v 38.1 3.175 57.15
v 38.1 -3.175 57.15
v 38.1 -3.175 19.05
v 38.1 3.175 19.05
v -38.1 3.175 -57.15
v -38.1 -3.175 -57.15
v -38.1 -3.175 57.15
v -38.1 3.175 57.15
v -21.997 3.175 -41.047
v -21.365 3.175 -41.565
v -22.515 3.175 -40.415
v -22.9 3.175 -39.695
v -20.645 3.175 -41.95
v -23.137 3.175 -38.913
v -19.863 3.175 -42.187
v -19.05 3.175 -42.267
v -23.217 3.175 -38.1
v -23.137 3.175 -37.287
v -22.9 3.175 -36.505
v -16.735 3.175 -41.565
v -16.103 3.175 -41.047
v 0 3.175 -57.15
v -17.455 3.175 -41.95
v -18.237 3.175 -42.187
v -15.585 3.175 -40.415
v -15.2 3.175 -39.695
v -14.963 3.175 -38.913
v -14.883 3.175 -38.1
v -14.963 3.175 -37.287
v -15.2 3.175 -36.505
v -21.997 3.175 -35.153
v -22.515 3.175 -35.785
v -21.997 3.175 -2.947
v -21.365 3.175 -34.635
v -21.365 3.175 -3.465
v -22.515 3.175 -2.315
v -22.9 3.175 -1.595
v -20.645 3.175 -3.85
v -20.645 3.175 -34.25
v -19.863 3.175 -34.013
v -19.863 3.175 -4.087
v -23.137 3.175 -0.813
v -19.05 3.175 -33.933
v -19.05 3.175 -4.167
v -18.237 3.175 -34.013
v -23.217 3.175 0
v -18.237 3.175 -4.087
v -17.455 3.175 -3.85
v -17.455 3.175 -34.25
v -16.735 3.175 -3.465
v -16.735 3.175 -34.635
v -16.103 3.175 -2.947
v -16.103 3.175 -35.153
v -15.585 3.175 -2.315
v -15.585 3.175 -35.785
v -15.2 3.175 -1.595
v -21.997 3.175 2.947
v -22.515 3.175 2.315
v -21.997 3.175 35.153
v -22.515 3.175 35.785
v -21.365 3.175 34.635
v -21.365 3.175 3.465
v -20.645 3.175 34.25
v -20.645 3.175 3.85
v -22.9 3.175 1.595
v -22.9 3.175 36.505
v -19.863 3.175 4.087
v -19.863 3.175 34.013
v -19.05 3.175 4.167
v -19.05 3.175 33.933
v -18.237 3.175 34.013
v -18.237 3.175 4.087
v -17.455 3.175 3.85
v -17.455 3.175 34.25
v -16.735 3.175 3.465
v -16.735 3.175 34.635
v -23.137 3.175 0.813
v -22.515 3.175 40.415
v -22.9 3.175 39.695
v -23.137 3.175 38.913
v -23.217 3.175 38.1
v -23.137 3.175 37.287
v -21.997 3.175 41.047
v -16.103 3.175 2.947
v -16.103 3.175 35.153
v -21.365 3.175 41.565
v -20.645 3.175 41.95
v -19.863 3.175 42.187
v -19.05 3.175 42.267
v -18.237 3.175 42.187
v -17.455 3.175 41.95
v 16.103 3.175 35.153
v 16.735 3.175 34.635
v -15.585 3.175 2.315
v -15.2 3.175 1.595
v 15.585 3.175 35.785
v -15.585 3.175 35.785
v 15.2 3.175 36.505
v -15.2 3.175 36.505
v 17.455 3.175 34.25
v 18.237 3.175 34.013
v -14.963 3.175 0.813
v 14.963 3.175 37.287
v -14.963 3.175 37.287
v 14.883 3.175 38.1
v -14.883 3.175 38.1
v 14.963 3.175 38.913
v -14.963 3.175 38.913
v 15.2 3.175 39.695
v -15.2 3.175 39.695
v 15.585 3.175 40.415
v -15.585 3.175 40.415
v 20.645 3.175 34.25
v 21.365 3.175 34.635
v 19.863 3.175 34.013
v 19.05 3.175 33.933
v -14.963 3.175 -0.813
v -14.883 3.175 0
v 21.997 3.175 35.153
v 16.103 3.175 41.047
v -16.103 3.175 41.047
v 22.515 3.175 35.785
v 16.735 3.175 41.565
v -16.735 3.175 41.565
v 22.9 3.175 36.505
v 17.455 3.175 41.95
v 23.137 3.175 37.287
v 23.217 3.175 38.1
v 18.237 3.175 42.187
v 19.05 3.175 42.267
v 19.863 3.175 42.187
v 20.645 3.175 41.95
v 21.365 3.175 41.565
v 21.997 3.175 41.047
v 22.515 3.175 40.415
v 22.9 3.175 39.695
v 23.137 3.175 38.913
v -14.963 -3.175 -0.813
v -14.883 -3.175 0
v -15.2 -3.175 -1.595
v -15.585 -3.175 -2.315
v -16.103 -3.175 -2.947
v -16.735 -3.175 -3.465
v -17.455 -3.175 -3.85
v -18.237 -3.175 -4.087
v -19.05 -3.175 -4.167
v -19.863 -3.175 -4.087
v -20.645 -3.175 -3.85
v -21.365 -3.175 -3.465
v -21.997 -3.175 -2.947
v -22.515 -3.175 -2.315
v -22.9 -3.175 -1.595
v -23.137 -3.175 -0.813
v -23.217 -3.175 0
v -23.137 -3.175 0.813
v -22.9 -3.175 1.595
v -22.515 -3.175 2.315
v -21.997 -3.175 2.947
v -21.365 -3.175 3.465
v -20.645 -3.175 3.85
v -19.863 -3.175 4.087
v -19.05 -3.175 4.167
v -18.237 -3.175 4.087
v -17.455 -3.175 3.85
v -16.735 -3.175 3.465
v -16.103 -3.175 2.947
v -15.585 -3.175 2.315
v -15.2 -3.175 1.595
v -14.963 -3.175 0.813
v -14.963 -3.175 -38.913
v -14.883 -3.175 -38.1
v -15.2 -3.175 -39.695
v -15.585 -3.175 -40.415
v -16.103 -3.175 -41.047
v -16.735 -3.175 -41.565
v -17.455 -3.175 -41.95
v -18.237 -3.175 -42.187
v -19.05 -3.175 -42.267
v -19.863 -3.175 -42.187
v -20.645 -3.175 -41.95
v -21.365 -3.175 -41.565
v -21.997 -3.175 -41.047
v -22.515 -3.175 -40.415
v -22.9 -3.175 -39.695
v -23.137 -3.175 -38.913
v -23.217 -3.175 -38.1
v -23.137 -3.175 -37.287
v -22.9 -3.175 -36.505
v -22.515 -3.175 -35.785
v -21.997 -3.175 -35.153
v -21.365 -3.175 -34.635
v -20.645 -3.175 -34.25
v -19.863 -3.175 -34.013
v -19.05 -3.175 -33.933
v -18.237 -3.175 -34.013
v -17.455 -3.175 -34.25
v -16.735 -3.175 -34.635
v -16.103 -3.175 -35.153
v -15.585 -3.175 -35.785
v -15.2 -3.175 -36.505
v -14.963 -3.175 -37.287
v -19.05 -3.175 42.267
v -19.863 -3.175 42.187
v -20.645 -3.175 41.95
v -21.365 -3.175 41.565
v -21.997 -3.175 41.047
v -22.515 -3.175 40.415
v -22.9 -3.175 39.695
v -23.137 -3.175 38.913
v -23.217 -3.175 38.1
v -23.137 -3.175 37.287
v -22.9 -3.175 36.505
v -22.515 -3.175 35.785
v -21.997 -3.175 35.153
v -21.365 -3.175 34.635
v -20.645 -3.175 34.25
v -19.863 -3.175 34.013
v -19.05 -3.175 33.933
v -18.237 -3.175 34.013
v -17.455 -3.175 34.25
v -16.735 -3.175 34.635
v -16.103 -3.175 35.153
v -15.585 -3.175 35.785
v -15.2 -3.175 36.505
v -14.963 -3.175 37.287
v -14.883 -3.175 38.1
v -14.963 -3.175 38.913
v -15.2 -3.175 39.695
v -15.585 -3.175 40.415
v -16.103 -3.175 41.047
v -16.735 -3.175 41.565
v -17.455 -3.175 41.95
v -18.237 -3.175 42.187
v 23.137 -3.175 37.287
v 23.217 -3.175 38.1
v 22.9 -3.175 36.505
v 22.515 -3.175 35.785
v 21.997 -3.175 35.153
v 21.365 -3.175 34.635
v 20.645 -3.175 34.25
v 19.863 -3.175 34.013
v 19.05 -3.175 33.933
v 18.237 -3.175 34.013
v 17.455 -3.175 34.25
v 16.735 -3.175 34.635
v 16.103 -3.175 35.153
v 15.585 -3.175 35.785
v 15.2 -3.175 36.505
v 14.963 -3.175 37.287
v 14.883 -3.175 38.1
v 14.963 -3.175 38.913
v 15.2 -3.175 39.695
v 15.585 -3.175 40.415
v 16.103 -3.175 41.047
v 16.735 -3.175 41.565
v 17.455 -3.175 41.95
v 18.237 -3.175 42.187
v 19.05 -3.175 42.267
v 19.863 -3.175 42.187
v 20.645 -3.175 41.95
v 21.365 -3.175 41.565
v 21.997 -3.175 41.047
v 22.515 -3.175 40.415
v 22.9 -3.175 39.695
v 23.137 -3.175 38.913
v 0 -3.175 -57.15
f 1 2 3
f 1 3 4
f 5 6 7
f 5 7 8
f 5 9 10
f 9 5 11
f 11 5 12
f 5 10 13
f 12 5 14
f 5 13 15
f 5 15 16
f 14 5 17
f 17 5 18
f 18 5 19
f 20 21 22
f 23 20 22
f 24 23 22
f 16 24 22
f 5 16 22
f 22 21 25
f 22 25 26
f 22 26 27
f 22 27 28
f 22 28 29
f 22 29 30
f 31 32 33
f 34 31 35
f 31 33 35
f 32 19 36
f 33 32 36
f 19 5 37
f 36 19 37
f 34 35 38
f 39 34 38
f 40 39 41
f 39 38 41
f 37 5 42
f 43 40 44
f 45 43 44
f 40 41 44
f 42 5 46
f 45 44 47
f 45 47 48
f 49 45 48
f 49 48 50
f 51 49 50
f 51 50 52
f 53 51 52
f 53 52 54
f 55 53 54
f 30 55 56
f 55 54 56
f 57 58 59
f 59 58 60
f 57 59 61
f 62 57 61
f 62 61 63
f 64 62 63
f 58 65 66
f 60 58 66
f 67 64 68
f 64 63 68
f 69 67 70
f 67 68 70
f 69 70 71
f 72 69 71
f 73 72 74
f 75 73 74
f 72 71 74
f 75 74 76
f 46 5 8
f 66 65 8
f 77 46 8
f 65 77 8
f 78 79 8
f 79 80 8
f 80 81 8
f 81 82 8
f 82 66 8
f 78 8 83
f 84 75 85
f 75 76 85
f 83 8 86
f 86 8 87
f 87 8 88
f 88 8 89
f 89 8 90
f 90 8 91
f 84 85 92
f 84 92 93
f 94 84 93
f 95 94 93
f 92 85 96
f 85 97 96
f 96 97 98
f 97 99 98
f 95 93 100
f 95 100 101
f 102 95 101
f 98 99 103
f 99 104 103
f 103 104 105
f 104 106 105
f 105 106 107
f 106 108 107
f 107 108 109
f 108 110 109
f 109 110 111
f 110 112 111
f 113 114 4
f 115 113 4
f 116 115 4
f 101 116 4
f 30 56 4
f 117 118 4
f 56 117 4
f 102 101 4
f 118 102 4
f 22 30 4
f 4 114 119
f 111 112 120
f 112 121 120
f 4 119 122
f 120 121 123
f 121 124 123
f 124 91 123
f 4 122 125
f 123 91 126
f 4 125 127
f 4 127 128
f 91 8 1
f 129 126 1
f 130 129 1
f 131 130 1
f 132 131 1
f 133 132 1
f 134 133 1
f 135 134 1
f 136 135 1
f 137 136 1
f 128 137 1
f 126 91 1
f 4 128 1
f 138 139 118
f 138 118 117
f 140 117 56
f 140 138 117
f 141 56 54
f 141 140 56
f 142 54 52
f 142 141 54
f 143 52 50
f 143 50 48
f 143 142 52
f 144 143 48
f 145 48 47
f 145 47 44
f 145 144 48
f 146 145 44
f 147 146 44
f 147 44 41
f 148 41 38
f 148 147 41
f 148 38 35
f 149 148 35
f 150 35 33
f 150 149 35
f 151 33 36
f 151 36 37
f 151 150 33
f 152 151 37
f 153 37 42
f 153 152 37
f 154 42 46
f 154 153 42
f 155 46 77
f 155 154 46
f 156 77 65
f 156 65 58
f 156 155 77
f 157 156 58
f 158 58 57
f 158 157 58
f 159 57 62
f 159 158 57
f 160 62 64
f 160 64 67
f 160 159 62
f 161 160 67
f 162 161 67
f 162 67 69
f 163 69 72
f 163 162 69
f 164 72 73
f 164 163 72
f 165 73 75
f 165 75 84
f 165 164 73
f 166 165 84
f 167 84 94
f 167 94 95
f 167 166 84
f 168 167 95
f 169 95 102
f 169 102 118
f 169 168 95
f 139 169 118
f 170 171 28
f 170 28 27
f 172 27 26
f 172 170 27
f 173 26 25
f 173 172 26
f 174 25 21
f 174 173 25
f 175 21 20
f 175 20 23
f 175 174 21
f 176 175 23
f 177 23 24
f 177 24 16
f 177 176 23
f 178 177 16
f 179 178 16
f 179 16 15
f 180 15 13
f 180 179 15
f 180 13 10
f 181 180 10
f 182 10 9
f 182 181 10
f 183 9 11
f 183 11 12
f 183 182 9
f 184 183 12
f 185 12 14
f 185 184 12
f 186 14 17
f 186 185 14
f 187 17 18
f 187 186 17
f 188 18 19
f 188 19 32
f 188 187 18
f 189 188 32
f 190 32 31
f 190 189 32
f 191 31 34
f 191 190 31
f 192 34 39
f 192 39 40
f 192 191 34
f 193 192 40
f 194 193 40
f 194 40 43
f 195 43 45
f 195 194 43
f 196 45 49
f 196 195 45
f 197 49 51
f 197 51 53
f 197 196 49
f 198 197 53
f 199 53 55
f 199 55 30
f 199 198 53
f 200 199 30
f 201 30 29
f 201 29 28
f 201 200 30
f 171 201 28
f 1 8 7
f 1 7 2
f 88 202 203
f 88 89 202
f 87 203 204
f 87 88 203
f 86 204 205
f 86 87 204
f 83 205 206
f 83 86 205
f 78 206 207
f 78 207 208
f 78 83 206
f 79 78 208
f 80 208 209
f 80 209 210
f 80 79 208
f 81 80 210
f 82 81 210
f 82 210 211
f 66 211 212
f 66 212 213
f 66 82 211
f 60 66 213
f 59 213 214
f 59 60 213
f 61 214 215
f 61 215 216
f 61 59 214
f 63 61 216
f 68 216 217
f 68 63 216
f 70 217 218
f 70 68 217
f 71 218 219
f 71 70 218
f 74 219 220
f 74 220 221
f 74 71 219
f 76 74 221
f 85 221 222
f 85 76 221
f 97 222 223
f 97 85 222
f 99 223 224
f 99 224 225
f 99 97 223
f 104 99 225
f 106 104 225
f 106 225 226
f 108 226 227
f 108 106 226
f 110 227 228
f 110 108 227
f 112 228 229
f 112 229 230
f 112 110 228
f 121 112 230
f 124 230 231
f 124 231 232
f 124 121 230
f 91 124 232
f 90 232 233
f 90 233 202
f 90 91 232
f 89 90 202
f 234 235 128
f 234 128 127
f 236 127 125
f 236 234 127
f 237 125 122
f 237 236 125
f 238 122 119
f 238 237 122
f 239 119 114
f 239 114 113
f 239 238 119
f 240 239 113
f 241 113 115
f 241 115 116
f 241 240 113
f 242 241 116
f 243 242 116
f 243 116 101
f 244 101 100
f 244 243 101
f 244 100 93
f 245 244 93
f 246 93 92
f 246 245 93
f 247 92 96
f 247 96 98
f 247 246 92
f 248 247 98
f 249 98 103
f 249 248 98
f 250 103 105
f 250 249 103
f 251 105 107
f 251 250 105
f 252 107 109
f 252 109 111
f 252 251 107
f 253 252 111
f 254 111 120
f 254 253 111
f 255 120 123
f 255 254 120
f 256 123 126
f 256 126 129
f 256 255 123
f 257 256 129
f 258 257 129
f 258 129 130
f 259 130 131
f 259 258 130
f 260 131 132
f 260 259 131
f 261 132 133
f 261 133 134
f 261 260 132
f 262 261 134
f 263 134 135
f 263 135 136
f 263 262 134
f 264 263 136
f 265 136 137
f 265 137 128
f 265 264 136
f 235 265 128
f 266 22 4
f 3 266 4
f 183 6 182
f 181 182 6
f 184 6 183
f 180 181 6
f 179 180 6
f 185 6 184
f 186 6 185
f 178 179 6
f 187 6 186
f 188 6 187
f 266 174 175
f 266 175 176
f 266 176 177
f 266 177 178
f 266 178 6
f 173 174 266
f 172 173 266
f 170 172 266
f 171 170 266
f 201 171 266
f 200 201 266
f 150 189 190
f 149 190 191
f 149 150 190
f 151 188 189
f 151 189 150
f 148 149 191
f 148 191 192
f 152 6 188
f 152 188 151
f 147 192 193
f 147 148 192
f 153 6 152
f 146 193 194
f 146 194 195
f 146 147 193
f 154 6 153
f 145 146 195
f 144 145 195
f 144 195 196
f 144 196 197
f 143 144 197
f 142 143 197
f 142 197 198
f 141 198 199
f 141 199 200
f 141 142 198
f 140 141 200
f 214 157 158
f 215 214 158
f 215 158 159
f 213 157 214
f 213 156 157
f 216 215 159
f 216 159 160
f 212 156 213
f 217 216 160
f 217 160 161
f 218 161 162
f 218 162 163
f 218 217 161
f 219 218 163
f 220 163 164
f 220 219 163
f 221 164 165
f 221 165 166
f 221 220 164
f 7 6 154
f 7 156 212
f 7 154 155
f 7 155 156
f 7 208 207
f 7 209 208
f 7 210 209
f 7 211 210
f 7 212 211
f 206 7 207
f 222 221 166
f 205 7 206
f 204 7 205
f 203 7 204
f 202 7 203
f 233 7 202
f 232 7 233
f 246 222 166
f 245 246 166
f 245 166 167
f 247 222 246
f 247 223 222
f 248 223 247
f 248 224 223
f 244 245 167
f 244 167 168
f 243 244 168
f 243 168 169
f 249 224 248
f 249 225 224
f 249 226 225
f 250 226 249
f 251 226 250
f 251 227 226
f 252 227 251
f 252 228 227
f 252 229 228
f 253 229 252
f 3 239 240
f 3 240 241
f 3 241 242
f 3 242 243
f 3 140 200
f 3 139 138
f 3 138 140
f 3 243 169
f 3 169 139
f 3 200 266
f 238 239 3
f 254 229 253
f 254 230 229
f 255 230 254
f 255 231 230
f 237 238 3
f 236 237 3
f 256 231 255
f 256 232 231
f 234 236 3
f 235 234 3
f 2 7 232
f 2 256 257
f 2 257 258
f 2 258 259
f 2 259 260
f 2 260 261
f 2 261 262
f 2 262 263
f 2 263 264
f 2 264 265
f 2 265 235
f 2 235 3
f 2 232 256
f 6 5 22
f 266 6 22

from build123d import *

# Parameters (mm, degrees)
SKETCH1_W            = 76.2
SKETCH1_H            = 6.35
BOSS_EXTRUDE1_DEPTH  = 57.15
CUT_EXTRUDE3_DEPTH   = 7.62
LPATTERN1_COUNT      = 3
LPATTERN1_PITCH      = 38.1
LPATTERN1_COUNT_DIR2 = 2
LPATTERN1_PITCH_DIR2 = 38.1


with BuildPart() as part:
    # Sketch1 → Boss-Extrude1 (new, symmetric)
    with BuildSketch(Plane.XY):
        Rectangle(SKETCH1_W, SKETCH1_H)
    extrude(amount=BOSS_EXTRUDE1_DEPTH, both=True)

    # Sketch8 → Cut-Extrude3 (cut)
    with BuildSketch(Plane(origin=(0, 3.175, 0), x_dir=(-1, 0, 0), z_dir=(0, 1, 0))):
        Polygon((0, -57.15), (-38.1, 19.05), (-38.1, -57.15), align=None)
    extrude(amount=-CUT_EXTRUDE3_DEPTH, mode=Mode.SUBTRACT)

    # Sketch9 → 21/64 (0.32813) Diameter Hole1 (revolve, cut)
    with BuildSketch(Plane(origin=(-19.05, 3.175, 38.1), x_dir=(0, 0, 1), z_dir=(1, 0, 0))):
        Polygon((0, 0), (0, 8.853937016), (4.167251, 6.35), (4.167251, 0), align=None)
    f_21_64_0_32813_diameter_hole1 = revolve(axis=Axis((-19.05, 9.525, 38.1), (0, -1, 0)), mode=Mode.SUBTRACT)

    # LPattern1: 21_64 _0.32813_ Diameter Hole1 3 × 2, 2 skipped
    with Locations(*[(j * LPATTERN1_PITCH_DIR2, 0, -i * LPATTERN1_PITCH) for i in range(LPATTERN1_COUNT) for j in range(LPATTERN1_COUNT_DIR2) if (i, j) not in ((0, 0), (1, 1), (2, 1))]):
        add(f_21_64_0_32813_diameter_hole1, mode=Mode.SUBTRACT)


solid = part.part
